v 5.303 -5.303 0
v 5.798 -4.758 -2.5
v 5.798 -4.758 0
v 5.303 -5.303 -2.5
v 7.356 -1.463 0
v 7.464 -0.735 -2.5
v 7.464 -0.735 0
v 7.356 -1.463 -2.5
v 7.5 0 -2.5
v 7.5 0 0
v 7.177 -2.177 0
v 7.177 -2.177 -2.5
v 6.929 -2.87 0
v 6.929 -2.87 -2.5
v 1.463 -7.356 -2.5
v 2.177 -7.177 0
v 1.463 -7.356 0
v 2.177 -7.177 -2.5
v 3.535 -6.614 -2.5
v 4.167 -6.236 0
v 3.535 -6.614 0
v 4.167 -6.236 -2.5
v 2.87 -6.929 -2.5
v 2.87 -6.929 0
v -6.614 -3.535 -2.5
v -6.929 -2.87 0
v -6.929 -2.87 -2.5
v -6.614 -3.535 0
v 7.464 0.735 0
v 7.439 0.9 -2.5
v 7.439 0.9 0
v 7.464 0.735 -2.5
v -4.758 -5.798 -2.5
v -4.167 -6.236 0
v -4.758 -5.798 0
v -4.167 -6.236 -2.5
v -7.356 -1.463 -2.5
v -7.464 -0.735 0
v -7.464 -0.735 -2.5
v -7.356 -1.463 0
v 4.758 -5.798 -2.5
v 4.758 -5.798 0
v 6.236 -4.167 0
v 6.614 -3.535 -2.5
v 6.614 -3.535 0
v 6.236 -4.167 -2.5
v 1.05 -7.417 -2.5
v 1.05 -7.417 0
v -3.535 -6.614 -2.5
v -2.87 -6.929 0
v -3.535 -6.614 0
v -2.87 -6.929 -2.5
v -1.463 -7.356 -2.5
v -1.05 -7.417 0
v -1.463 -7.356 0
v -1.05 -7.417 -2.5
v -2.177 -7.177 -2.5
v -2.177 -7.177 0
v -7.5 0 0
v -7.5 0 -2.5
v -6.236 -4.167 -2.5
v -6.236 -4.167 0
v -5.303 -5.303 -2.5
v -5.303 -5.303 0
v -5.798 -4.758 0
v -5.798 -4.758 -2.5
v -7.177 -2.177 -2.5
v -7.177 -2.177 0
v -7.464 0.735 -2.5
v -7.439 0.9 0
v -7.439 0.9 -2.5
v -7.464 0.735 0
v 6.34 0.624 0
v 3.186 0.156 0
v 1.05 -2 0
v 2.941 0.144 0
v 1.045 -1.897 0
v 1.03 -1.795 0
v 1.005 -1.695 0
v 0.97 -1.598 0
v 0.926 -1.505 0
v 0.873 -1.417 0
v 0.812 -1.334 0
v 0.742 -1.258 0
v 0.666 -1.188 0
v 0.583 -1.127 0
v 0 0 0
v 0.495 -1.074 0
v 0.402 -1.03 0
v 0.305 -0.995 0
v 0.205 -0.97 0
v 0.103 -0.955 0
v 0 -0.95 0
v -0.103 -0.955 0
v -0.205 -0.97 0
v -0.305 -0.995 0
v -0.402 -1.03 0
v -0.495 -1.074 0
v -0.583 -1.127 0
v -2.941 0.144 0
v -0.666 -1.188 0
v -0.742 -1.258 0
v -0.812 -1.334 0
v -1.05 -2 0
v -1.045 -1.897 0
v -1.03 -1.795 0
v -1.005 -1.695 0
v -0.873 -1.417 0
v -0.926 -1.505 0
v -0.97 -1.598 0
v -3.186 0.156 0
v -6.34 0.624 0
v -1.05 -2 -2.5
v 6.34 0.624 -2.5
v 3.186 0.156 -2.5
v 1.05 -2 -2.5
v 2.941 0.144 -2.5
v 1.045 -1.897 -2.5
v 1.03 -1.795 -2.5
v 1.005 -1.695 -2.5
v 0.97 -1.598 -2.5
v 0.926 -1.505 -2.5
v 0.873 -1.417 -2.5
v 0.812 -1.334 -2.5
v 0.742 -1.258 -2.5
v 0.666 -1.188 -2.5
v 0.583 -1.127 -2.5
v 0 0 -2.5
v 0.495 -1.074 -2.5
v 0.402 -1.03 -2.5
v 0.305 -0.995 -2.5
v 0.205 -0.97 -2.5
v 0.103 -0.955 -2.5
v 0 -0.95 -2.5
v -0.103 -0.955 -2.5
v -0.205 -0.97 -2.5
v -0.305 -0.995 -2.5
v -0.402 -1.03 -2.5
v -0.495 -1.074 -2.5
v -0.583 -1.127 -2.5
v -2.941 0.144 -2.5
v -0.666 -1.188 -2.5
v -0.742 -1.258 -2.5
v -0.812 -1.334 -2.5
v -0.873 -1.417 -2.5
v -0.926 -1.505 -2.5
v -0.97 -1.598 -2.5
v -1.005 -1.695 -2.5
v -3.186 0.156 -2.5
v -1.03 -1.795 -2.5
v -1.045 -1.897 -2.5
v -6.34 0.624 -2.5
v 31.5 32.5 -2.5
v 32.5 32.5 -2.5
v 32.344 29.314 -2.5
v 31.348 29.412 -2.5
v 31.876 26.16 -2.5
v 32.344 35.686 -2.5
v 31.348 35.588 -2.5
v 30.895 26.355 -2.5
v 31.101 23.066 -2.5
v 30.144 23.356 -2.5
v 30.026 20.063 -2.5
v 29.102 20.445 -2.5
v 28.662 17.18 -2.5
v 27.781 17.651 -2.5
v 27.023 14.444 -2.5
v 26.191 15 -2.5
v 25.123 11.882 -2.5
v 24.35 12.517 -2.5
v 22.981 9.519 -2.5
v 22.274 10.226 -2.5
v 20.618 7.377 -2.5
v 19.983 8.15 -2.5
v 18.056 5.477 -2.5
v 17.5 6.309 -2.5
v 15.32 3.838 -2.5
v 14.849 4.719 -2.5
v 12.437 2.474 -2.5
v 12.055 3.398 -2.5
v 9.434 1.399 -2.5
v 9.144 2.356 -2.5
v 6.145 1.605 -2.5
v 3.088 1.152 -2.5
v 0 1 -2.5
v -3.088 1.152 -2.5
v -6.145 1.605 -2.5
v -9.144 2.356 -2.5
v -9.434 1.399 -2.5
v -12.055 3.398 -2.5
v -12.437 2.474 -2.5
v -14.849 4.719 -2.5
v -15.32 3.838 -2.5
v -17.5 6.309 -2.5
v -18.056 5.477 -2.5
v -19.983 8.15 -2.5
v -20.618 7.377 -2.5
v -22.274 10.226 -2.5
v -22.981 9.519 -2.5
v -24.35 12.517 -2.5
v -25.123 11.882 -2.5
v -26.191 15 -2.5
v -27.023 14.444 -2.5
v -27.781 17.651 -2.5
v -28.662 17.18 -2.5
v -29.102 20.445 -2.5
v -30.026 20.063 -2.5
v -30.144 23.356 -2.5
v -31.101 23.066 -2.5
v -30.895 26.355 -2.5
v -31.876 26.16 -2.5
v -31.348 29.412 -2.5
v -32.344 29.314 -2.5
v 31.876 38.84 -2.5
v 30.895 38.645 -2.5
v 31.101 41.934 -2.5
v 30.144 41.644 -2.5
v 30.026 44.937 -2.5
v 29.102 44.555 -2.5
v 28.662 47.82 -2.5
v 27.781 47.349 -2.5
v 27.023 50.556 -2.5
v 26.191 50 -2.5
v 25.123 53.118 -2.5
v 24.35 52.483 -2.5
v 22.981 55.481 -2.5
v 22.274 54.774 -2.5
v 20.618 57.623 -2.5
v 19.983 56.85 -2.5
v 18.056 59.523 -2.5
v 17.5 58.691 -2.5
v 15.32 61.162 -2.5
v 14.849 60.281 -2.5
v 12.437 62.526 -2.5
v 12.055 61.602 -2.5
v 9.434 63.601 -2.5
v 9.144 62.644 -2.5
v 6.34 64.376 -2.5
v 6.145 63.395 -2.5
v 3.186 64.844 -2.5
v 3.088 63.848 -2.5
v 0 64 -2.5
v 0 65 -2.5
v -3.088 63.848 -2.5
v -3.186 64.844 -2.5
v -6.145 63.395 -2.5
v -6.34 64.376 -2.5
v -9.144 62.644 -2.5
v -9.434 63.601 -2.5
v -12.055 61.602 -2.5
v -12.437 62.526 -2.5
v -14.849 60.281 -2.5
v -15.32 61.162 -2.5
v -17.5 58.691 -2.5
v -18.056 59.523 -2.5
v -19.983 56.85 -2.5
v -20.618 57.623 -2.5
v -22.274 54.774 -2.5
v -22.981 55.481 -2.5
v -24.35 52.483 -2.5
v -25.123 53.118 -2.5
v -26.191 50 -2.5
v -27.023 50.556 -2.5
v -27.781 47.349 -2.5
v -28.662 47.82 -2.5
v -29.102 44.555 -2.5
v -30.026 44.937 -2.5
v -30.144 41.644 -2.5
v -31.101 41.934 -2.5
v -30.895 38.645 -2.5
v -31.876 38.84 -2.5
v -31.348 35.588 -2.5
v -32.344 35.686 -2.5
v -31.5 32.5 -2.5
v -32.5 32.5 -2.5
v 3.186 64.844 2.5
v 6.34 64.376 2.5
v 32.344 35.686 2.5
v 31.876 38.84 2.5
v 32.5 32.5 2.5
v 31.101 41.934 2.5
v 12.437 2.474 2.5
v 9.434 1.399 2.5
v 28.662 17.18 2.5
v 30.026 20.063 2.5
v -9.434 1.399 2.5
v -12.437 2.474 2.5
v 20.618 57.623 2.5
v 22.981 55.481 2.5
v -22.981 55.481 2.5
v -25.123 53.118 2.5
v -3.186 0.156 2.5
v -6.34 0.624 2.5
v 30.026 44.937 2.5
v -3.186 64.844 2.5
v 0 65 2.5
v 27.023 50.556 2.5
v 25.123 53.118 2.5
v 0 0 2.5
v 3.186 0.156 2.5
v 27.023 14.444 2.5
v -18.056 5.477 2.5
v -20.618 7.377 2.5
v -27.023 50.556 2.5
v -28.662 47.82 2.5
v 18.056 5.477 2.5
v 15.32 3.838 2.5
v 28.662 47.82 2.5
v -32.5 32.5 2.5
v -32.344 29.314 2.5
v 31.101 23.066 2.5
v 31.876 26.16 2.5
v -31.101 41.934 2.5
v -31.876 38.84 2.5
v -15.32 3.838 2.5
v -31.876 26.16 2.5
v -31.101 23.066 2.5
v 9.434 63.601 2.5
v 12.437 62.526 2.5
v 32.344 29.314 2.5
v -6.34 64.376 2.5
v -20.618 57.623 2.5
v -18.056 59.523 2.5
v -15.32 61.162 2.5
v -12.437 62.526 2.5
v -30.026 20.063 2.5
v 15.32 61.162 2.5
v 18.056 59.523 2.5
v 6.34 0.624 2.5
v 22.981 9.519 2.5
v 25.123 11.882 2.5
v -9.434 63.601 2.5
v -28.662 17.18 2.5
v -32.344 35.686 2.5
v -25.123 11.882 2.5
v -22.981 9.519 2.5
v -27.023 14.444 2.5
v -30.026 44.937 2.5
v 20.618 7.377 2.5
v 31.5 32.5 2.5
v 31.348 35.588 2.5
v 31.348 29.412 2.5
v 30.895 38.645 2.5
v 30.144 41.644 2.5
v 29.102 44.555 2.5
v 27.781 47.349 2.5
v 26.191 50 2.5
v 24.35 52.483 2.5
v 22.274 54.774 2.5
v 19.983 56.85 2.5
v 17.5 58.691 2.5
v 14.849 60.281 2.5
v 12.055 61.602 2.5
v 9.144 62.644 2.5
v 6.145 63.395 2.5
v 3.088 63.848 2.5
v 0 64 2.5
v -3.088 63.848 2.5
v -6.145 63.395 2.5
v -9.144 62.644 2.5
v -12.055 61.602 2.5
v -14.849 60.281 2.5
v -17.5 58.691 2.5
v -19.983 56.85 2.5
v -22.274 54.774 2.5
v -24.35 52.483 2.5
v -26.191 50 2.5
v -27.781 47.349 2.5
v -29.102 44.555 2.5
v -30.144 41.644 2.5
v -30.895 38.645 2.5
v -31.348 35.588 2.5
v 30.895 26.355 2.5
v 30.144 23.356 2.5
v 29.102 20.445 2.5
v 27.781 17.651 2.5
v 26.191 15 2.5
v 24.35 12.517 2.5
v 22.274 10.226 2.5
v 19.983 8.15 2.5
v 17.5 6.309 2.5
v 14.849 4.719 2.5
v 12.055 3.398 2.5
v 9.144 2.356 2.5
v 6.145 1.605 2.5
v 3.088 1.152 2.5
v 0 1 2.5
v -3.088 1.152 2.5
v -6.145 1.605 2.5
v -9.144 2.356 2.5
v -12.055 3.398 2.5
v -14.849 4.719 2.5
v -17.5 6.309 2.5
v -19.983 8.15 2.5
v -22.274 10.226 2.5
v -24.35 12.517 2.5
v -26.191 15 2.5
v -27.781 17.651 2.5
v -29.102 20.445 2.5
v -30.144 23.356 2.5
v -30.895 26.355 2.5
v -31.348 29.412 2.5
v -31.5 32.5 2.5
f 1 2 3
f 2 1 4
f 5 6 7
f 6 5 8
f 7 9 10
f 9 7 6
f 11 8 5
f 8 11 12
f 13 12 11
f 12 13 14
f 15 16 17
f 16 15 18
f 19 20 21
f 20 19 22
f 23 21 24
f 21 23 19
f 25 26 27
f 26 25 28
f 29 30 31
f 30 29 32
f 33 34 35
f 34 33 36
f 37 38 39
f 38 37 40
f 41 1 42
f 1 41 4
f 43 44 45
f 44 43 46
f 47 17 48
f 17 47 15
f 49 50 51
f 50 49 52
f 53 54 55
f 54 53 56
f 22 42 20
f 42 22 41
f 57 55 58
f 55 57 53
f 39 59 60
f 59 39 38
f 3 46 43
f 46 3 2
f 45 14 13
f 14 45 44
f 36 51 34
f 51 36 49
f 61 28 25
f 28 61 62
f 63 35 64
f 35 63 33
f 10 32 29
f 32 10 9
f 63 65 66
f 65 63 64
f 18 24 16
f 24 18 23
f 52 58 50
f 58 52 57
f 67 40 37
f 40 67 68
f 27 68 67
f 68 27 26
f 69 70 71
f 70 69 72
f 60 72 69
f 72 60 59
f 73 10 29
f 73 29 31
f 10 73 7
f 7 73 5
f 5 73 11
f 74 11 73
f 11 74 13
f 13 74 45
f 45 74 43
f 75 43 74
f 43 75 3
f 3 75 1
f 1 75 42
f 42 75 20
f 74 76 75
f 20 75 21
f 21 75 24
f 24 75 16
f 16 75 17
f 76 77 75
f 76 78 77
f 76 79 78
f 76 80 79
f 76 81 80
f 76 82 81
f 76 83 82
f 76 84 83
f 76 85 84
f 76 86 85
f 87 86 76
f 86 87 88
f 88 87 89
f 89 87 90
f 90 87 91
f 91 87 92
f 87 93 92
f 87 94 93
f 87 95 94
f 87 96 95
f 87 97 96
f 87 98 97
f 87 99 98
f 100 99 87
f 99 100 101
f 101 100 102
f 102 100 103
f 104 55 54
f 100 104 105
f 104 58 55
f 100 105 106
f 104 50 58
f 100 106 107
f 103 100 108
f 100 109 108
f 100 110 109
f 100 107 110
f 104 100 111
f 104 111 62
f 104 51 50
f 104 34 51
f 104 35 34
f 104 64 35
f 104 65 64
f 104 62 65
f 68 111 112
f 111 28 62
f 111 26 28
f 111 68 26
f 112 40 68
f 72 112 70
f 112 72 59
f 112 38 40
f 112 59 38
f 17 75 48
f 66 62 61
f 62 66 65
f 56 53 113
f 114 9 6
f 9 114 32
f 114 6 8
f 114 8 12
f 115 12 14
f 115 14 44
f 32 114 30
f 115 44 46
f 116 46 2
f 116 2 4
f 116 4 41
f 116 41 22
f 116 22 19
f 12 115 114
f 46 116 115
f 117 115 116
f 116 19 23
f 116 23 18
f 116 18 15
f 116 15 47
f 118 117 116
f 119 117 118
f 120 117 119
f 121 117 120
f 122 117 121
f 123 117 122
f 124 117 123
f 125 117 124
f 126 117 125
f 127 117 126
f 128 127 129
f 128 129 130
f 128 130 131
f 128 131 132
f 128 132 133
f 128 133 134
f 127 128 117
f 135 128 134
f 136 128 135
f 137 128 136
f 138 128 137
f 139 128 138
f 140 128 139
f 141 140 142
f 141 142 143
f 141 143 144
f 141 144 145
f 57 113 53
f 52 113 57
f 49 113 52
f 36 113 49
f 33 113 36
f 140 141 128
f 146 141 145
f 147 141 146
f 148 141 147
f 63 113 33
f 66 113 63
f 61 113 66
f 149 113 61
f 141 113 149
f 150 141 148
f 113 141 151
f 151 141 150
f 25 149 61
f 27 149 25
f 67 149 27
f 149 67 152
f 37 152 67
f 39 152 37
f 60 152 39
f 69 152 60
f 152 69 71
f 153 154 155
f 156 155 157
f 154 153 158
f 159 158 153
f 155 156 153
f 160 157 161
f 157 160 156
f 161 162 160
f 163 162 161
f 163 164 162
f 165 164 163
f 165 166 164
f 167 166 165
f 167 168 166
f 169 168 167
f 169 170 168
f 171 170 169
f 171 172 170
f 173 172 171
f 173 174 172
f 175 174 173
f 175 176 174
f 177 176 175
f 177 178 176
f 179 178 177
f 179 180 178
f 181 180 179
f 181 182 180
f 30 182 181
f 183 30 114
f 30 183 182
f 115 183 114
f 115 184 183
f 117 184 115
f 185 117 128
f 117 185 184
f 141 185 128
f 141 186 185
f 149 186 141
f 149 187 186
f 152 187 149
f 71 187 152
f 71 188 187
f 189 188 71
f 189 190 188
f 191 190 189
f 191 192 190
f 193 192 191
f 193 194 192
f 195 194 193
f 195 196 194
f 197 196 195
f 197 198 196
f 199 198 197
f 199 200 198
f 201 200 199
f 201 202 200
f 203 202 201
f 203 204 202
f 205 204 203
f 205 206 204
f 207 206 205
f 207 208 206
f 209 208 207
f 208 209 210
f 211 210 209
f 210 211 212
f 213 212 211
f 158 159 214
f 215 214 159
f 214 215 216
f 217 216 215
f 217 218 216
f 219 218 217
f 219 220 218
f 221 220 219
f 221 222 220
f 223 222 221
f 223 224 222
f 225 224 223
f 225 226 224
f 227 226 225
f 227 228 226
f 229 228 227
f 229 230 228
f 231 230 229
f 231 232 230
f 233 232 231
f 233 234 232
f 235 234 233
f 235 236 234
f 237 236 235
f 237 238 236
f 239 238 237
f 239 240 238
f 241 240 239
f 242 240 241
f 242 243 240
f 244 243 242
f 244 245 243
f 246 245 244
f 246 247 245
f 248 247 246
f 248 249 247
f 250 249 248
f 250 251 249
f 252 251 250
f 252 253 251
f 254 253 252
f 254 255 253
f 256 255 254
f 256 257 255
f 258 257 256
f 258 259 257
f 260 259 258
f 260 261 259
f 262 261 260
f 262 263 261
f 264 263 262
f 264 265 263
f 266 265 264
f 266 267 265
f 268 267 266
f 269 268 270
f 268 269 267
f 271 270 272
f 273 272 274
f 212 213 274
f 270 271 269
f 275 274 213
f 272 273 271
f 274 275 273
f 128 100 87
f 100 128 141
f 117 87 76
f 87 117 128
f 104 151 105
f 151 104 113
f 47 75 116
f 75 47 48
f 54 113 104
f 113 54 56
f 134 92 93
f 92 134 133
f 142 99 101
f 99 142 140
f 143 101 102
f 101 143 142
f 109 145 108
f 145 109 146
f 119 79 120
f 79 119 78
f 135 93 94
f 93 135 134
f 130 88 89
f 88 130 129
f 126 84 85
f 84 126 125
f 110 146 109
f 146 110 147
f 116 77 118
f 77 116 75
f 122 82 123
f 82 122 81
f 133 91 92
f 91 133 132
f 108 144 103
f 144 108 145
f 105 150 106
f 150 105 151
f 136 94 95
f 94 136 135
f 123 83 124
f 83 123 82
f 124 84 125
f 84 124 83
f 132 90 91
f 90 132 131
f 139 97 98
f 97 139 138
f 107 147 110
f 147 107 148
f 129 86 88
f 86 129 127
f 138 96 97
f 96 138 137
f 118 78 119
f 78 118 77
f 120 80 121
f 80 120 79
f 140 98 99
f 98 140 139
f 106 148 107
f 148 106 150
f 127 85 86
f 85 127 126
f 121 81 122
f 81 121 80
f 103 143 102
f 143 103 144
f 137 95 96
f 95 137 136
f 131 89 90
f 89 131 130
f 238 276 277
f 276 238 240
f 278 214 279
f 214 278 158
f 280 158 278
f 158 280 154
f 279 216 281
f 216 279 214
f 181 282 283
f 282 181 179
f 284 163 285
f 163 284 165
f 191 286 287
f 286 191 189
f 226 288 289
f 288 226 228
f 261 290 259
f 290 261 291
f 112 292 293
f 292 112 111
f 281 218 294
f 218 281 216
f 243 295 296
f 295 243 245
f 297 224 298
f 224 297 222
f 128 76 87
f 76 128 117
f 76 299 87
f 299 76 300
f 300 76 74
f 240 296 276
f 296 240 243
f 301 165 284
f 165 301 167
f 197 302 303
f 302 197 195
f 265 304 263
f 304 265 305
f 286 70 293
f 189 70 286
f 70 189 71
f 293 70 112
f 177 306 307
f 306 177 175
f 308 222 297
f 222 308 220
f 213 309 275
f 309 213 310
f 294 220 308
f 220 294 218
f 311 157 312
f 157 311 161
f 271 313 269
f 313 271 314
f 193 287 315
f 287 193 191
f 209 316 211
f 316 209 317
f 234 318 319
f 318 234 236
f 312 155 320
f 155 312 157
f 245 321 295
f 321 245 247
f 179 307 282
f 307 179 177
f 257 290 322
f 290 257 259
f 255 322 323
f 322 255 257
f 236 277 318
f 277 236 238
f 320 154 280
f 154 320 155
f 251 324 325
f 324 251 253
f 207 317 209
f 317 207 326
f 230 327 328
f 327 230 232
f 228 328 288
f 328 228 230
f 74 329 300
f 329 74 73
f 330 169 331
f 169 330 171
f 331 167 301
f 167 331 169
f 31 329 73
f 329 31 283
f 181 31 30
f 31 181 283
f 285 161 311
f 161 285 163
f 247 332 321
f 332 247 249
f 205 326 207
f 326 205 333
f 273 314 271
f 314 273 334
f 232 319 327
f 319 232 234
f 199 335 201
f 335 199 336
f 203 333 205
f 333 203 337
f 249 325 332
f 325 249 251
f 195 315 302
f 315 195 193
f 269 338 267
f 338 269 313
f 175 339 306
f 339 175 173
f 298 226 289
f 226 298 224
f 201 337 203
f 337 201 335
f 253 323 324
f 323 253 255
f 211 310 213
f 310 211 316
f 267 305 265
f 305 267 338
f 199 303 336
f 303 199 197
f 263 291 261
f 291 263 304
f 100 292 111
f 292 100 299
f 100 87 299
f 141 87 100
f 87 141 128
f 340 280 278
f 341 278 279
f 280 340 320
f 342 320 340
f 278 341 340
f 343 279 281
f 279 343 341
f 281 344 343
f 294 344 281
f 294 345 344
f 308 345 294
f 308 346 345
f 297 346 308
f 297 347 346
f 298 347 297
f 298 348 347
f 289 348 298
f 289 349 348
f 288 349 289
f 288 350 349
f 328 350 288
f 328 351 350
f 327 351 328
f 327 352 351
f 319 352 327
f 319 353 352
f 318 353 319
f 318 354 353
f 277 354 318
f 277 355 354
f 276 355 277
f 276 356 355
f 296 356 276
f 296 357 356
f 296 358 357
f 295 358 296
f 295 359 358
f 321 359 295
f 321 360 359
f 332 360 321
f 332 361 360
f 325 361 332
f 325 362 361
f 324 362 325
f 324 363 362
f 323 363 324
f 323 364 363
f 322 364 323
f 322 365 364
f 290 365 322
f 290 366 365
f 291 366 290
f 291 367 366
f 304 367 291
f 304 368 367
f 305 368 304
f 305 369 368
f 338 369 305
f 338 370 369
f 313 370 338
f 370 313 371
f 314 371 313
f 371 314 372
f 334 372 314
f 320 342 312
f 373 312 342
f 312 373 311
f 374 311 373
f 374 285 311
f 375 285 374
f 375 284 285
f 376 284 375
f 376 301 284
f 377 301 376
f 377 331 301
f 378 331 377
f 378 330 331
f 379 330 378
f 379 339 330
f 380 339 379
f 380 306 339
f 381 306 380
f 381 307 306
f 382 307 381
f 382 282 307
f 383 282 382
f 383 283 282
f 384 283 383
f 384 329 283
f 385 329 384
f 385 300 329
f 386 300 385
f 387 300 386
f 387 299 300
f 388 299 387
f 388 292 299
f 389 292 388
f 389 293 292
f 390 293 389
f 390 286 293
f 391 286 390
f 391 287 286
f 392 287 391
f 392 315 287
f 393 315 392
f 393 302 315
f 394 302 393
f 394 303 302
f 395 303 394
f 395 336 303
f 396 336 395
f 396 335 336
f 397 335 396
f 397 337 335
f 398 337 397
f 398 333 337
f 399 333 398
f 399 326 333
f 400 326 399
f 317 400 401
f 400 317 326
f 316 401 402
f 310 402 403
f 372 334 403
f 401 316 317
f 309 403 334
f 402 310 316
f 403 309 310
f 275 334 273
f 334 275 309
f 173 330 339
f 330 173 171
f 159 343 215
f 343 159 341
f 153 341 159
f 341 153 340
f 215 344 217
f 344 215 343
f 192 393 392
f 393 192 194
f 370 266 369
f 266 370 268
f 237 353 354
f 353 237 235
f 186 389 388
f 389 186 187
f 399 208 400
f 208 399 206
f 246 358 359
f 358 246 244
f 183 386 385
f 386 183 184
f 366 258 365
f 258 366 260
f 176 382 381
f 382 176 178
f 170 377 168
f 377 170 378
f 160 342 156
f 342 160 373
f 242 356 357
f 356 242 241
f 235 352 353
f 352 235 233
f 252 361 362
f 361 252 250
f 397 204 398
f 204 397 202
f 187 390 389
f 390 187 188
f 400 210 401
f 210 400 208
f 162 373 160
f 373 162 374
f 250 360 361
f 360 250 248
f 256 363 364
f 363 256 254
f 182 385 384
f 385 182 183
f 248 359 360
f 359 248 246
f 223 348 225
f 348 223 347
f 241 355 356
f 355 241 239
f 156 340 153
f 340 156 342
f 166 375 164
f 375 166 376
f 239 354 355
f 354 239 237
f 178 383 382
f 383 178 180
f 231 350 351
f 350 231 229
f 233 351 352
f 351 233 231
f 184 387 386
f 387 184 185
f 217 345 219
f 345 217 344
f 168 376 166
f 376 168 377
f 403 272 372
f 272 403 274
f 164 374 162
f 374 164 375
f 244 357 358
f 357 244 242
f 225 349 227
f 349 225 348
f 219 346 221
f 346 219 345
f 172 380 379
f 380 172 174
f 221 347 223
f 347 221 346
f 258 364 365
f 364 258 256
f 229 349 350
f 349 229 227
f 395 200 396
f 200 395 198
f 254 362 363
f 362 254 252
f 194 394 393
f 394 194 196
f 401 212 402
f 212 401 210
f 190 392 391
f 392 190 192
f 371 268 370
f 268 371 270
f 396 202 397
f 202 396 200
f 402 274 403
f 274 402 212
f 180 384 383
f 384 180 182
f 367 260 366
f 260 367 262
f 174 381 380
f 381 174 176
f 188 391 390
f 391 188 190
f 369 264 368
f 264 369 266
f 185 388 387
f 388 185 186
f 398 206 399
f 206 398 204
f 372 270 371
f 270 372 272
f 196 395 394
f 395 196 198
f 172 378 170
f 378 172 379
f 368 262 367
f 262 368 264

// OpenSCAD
$fn=64;
d=15; //diameter of the ears
sd=2; //diameter of the hole
h=5;
e=0.01;
2e=2*e;
lensd=60;

rotate([90,0,0])
rabbit_ears();
ringd=65;
translate([0,ringd/2,-h/2]) ring(ringd);

module rabbit_ears(slope=0){
    difference(){
        rotate([90,0,0]) cylinder(d=d, h=h);
        // translate([0,0,-d/4]) cube([d,d,d/2], true);
        translate([0,-h,d/3]) rotate([-slope,0,0]) cube([d,h,d],true);
        translate([0, e, -lensd/2]) rotate([90,0,0]) cylinder(d=lensd, h=2*h);
        hull(){
            rotate([90,0,0]) {
                translate([0,sd,-e]) cylinder(d=sd+0.1, h=2*h);
                translate([0,d,-e]) cylinder(d=sd+0.1, h=2*h);
            }

        }
    }

}



module ring(d=65, t=2){
    difference(){
        cylinder(d=d, h=5);
        cylinder(d=d-t, h=5+2e);

    }

}
